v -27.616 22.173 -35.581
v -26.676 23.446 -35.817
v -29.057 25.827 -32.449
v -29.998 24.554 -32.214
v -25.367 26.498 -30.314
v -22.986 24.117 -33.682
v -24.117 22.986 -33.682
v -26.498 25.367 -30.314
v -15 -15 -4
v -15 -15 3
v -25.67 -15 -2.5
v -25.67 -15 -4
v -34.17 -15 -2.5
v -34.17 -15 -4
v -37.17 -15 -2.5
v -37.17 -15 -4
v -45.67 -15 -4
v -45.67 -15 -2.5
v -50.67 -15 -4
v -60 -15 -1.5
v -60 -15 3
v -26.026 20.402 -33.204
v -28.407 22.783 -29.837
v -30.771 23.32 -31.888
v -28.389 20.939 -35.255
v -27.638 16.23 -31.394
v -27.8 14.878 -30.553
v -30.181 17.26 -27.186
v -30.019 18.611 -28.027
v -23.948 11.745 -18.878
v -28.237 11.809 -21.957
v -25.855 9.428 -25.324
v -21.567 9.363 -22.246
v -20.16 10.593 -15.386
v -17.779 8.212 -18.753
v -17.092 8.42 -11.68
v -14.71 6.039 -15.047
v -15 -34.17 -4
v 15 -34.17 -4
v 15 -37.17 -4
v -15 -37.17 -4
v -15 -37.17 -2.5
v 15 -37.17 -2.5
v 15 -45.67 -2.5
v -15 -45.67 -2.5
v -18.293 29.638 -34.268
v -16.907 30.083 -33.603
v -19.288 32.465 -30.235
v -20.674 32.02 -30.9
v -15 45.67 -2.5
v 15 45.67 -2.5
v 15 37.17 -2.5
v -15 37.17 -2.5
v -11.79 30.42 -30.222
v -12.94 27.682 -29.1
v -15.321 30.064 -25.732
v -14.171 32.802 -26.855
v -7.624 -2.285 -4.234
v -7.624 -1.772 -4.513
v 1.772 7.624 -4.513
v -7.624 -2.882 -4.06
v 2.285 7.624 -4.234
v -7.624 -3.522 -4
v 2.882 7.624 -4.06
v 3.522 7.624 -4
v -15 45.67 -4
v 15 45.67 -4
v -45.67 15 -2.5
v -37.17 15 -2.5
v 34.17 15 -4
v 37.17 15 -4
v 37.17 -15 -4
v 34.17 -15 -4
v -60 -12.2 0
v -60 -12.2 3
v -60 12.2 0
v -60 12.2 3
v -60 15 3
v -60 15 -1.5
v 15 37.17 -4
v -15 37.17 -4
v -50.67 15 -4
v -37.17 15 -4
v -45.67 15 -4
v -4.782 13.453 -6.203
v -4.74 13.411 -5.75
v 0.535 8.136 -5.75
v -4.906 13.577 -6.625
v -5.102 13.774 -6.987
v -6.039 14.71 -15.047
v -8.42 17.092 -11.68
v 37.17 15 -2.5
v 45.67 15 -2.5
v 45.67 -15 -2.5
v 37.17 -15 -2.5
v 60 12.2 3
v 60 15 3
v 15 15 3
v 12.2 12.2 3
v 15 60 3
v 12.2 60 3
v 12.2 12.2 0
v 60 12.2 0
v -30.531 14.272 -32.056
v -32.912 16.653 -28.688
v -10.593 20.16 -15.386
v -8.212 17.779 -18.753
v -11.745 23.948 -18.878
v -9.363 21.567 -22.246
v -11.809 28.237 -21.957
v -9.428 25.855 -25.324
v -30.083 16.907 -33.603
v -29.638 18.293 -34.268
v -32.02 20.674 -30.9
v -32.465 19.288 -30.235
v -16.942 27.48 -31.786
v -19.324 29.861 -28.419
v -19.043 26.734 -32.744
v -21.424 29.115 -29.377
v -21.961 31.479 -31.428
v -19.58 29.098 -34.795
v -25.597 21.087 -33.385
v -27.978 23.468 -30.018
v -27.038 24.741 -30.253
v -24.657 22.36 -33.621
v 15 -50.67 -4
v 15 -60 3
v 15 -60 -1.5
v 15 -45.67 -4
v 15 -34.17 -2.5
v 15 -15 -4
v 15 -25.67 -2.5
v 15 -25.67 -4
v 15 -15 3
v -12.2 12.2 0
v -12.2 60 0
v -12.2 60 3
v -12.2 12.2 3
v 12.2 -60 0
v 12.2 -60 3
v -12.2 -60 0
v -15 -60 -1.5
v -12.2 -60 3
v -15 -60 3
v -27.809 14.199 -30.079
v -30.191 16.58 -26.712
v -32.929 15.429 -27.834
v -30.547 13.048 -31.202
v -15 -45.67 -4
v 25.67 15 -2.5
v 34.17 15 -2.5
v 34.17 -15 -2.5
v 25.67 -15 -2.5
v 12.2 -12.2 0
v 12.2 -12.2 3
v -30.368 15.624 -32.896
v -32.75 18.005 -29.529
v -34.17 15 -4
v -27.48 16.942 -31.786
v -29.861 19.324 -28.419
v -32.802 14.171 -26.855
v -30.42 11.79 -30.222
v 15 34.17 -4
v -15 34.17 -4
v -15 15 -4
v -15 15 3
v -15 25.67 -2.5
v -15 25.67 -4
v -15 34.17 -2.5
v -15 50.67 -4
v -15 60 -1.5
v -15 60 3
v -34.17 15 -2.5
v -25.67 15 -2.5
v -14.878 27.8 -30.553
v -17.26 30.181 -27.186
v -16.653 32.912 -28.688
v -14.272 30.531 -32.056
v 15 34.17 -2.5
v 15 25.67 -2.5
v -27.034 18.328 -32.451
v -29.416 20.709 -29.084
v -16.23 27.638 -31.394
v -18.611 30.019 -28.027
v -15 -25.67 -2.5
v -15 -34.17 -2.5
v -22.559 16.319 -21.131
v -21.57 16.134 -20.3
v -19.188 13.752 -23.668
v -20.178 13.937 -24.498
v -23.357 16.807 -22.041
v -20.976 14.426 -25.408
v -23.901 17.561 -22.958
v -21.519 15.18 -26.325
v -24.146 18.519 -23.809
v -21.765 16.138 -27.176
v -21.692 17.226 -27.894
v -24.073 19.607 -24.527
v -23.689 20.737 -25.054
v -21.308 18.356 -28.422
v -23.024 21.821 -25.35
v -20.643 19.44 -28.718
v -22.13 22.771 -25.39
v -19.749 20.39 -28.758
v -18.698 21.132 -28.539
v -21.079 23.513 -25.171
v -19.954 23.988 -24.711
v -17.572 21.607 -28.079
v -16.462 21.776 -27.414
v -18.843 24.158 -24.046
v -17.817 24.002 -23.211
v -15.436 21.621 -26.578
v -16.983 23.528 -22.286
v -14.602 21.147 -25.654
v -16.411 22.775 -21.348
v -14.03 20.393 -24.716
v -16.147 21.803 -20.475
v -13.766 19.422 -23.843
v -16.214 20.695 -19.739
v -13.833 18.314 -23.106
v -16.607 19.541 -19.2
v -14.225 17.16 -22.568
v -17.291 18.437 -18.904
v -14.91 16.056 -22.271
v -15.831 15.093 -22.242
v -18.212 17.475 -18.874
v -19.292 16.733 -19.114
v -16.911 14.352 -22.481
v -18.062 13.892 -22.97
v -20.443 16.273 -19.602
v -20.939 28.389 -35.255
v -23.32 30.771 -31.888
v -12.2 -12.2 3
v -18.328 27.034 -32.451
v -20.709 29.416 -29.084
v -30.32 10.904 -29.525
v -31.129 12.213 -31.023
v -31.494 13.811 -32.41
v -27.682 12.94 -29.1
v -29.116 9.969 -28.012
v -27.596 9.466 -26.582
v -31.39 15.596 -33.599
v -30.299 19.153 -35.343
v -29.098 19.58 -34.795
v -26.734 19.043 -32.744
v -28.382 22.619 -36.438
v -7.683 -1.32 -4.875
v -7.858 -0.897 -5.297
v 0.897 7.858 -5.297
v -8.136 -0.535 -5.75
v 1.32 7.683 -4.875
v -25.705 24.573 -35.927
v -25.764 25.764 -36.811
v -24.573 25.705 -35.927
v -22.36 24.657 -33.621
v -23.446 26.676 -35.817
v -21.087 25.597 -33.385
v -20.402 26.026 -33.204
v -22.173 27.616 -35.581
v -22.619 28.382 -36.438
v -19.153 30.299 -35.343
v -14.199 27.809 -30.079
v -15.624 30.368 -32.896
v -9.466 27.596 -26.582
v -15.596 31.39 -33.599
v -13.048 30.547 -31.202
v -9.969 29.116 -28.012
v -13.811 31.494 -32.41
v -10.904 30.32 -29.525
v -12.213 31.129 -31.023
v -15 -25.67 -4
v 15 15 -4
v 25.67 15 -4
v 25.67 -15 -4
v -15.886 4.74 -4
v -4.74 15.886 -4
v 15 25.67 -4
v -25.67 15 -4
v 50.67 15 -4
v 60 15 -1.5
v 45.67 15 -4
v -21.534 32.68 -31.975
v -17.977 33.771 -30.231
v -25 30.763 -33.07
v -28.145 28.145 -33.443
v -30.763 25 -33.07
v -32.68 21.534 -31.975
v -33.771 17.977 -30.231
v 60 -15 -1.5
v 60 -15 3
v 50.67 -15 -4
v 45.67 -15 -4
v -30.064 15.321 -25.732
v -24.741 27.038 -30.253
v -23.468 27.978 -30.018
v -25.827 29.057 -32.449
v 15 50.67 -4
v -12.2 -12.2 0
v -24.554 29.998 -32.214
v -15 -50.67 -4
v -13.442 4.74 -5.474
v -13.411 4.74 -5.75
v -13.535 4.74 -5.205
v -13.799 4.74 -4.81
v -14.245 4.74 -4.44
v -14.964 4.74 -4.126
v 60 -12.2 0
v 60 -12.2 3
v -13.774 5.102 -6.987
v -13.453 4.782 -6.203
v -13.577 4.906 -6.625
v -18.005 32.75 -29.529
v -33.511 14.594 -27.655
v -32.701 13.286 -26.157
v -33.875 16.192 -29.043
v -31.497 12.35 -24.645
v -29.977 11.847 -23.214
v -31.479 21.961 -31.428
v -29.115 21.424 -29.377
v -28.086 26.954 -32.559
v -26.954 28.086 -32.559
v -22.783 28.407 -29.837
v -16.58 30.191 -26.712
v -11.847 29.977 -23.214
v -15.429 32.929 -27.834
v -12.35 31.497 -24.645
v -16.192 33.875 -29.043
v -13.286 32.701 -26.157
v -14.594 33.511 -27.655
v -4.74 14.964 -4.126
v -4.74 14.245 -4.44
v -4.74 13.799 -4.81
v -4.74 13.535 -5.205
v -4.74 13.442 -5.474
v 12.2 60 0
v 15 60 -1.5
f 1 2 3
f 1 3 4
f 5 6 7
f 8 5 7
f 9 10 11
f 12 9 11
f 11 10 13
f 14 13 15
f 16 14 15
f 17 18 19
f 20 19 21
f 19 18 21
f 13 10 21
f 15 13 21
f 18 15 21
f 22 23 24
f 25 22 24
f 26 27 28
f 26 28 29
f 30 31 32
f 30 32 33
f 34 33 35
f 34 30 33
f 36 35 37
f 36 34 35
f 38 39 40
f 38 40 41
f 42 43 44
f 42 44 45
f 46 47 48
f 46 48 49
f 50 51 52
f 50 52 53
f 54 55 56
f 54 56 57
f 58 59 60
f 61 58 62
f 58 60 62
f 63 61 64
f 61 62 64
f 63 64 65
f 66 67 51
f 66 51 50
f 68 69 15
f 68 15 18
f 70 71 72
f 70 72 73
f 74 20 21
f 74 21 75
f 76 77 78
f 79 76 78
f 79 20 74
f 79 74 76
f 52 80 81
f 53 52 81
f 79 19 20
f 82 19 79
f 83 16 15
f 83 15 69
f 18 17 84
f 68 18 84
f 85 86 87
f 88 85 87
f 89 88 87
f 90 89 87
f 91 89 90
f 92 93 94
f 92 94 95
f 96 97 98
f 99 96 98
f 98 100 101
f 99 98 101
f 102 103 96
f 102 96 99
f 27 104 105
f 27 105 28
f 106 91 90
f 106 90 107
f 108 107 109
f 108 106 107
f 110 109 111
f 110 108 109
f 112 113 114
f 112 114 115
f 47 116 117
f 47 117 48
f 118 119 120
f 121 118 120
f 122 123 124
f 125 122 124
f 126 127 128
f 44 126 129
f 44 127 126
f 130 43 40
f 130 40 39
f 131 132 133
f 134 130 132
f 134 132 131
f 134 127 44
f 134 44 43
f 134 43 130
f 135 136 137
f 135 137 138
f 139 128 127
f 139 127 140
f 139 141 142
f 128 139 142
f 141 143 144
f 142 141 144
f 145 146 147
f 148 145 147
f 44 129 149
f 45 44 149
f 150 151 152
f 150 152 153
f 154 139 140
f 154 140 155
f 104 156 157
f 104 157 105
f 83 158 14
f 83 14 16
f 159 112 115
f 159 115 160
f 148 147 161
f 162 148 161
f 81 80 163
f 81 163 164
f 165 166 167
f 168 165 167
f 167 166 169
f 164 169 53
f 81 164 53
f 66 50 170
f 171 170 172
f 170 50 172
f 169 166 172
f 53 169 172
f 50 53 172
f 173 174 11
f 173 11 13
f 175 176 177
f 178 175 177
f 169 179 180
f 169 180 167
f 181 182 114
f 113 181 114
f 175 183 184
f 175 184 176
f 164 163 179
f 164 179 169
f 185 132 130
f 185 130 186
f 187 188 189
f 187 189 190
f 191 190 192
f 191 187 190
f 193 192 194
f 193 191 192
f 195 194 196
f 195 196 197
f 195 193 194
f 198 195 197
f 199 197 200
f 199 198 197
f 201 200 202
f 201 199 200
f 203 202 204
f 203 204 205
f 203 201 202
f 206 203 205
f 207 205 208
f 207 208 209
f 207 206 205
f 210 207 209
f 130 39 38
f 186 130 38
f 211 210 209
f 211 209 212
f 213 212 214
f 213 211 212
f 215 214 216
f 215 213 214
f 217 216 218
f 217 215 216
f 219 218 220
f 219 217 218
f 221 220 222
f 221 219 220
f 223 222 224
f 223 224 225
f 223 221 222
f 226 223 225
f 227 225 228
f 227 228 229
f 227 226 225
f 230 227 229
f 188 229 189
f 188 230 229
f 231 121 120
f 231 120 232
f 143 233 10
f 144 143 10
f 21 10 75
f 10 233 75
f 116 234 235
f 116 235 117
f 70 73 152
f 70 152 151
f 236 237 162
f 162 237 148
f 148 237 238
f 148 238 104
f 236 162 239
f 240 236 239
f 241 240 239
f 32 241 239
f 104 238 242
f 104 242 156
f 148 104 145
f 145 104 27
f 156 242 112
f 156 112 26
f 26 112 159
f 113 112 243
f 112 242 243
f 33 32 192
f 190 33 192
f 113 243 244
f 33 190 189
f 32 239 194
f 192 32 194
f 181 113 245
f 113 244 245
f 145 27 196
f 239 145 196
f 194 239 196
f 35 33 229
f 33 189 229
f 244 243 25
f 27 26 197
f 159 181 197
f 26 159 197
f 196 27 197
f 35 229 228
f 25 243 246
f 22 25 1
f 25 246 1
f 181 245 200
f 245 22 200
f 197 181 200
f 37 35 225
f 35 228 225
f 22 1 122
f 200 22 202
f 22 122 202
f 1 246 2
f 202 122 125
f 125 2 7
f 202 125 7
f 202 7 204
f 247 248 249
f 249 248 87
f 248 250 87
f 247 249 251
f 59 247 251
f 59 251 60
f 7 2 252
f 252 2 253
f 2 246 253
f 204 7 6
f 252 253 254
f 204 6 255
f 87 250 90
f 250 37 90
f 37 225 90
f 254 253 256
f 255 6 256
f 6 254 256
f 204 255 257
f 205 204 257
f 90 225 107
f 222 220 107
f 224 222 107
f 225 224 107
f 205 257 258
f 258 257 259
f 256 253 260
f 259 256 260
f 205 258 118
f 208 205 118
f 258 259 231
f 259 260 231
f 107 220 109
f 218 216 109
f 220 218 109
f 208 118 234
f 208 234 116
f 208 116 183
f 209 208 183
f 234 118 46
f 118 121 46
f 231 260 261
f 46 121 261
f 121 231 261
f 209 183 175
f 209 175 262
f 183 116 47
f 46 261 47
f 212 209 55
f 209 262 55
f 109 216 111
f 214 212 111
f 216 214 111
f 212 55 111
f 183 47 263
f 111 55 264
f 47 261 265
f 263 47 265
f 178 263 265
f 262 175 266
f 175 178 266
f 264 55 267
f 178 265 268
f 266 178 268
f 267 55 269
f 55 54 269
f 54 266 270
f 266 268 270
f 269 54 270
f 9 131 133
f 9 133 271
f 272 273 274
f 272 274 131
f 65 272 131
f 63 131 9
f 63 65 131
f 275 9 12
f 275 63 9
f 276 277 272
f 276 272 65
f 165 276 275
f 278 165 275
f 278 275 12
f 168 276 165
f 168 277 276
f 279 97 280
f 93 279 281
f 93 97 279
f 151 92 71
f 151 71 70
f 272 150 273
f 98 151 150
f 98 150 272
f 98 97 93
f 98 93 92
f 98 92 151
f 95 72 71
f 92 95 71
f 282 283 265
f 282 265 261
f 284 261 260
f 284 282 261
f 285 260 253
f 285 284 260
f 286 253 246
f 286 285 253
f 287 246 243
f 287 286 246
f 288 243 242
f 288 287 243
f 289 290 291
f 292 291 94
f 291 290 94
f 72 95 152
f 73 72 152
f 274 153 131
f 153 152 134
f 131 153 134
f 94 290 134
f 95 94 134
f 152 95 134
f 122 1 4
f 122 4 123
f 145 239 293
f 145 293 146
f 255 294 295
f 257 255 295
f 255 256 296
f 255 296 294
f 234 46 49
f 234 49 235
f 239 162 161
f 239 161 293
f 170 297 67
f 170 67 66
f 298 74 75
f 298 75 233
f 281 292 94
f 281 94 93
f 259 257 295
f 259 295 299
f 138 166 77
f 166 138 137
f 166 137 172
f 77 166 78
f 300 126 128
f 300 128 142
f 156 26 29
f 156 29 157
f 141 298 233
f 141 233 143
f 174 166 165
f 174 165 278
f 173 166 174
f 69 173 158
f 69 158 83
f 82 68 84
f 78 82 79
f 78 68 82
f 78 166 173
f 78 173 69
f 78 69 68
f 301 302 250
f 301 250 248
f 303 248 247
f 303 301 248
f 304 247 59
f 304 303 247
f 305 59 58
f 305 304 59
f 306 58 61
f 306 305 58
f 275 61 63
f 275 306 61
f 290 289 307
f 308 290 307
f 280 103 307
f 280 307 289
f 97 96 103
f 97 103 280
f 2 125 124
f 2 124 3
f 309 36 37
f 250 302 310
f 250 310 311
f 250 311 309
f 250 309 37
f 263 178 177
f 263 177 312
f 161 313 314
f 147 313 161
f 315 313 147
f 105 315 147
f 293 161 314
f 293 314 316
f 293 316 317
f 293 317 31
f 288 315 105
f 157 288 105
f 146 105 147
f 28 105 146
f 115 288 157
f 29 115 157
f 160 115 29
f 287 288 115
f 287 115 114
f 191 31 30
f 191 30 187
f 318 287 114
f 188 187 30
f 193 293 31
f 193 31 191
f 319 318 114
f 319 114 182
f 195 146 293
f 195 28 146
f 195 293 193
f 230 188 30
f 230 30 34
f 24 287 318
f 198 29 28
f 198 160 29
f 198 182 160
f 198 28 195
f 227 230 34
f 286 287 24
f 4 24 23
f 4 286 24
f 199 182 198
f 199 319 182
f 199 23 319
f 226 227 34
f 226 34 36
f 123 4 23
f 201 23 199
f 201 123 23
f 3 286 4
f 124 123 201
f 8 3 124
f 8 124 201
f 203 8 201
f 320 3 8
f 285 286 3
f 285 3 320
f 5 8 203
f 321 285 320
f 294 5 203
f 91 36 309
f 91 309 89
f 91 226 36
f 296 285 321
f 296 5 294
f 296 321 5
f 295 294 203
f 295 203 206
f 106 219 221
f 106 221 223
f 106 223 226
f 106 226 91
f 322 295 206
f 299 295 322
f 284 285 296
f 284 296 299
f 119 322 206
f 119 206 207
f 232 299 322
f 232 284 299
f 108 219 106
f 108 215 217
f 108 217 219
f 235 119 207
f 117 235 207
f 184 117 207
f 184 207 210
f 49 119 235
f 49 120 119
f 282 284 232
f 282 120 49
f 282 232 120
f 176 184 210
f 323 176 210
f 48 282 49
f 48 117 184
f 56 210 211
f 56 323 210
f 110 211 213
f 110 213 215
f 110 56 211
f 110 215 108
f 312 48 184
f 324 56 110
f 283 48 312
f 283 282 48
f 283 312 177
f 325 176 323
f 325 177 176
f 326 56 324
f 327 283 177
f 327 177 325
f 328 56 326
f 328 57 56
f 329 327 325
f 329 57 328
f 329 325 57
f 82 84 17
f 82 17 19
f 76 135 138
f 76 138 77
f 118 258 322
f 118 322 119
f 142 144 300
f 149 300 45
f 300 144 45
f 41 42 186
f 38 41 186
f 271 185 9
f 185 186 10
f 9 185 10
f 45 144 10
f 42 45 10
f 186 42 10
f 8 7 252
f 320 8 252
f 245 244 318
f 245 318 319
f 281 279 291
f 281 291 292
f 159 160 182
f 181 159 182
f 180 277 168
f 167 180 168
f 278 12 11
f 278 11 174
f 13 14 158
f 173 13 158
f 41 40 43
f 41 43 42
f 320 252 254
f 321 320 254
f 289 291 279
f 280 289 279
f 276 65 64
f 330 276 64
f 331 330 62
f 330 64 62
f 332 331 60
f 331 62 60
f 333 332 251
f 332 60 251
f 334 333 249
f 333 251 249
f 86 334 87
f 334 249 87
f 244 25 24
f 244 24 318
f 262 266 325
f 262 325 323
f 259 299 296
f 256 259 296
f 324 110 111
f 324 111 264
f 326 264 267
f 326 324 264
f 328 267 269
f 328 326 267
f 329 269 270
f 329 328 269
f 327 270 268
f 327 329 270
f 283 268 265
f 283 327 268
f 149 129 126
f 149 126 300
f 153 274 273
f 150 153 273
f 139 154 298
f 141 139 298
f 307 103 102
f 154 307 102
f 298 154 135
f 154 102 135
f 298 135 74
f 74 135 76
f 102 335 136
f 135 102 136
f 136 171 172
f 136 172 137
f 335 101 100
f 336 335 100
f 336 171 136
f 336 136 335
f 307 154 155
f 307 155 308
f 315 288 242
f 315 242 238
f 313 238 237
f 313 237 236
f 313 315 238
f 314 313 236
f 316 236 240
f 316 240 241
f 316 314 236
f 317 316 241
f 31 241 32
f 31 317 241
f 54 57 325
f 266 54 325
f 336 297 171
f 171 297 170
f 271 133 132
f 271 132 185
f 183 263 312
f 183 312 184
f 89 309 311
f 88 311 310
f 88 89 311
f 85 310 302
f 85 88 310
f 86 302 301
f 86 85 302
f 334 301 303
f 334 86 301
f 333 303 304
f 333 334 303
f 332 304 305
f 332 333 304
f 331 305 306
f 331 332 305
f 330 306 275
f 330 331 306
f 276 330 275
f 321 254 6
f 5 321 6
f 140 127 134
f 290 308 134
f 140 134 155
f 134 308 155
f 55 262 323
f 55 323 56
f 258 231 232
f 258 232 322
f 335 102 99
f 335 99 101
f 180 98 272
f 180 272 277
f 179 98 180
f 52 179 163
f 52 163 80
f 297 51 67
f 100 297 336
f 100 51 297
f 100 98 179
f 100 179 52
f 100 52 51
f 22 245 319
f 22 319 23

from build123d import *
from OCP.BRepFilletAPI import BRepFilletAPI_MakeChamfer

# Parameters (mm, degrees)
SKETCH1_W           = 1.85
SKETCH1_H           = 38.85
SKETCH1_H_2         = 6.15
SKETCH1_W_2         = 44.85
SKETCH1_H_3         = 1.85
SKETCH1_W_3         = 0.15
BOSS_EXTRUDE1_DEPTH = 3
SKETCH1_4_W         = 120
SKETCH1_4_H         = 30
SKETCH1_4_W_2       = 30
SKETCH1_4_H_2       = 120
BOSS_EXTRUDE3_DEPTH = 4
BOSS_EXTRUDE9_DEPTH = 3
CHAMFER1_SIZE       = 2.5
CHAMFER1_SIZE2      = 9.330127019
SKETCH4_W           = 8.5
SKETCH4_H           = 30
SKETCH4_W_2         = 30
SKETCH4_H_2         = 8.5
CUT_EXTRUDE1_DEPTH  = 1.5
BOSS_EXTRUDE7_DEPTH = 4.7625
SKETCH10_R          = 14.258178215
CUT_EXTRUDE2_DEPTH  = 91.287114527
FILLET1_R           = 1.75
BOSS_EXTRUDE8_DEPTH = 4.7625
CUT_EXTRUDE3_DEPTH  = 97.69049149


with BuildPart() as part:
    # Sketch1 → Boss-Extrude1 (new body)
    with BuildSketch(Plane(origin=(0, 0, 0), x_dir=(-1, 0, 0), z_dir=(0, 0, -1))):
        with Locations((14.075, 40.575)):
            Rectangle(SKETCH1_W, SKETCH1_H)
        with Locations((14.075, 18.075)):
            Rectangle(SKETCH1_W, SKETCH1_H_2)
        with Locations((37.575, 14.075)):
            Rectangle(SKETCH1_W_2, SKETCH1_H_3)
        with Locations((14.075, 14.075)):
            Rectangle(SKETCH1_W, SKETCH1_H_3)
        with Locations((14.075, -14.075)):
            Rectangle(SKETCH1_W, SKETCH1_H_3)
        with Locations((14.075, -18.075)):
            Rectangle(SKETCH1_W, SKETCH1_H_2)
        with Locations((37.575, -14.075)):
            Rectangle(SKETCH1_W_2, SKETCH1_H_3)
        with Locations((14.075, -40.575)):
            Rectangle(SKETCH1_W, SKETCH1_H)
        with Locations((-14.075, -14.075)):
            Rectangle(SKETCH1_W, SKETCH1_H_3)
        with Locations((-14.075, -18.075)):
            Rectangle(SKETCH1_W, SKETCH1_H_2)
        with Locations((-37.575, -14.075)):
            Rectangle(SKETCH1_W_2, SKETCH1_H_3)
        with Locations((-15.075, -14.075)):
            Rectangle(SKETCH1_W_3, SKETCH1_H_3)
        with Locations((15.075, -14.075)):
            Rectangle(SKETCH1_W_3, SKETCH1_H_3)
        with Locations((15.075, 14.075)):
            Rectangle(SKETCH1_W_3, SKETCH1_H_3)
        with Locations((-37.575, 14.075)):
            Rectangle(SKETCH1_W_2, SKETCH1_H_3)
        with Locations((-15.075, 14.075)):
            Rectangle(SKETCH1_W_3, SKETCH1_H_3)
        with Locations((-14.075, 18.075)):
            Rectangle(SKETCH1_W, SKETCH1_H_2)
        with Locations((-14.075, 14.075)):
            Rectangle(SKETCH1_W, SKETCH1_H_3)
        with Locations((-14.075, 40.575)):
            Rectangle(SKETCH1_W, SKETCH1_H)
        with Locations((-14.075, -40.575)):
            Rectangle(SKETCH1_W, SKETCH1_H)
    extrude(amount=-BOSS_EXTRUDE1_DEPTH)

    # Sketch1<4> → Boss-Extrude3 (add)
    with BuildSketch(Plane(origin=(0, 0, 0), x_dir=(-1, 0, 0), z_dir=(0, 0, -1))):
        Rectangle(SKETCH1_4_W, SKETCH1_4_H)
        Rectangle(SKETCH1_4_W_2, SKETCH1_4_H_2)
    extrude(amount=BOSS_EXTRUDE3_DEPTH)

    # Sketch13 → Boss-Extrude9 (add)
    with BuildSketch(Plane.XY):
        Polygon((-12.2, 12.2), (-60, 12.2), (-60, 13.15), (-13.15, 13.15), (-13.15, 60), (-12.2, 60), align=None)
        Polygon((-60, -12.2), (-12.2, -12.2), (-12.2, -60), (-13.15, -60), (-13.15, -13.15), (-60, -13.15), align=None)
        Polygon((12.2, -60), (12.2, -12.2), (60, -12.2), (60, -13.15), (13.15, -13.15), (13.15, -60), align=None)
        Polygon((60, 12.2), (12.2, 12.2), (12.2, 60), (13.15, 60), (13.15, 13.15), (60, 13.15), align=None)
    extrude(amount=BOSS_EXTRUDE9_DEPTH)

    # Chamfer1: one chamfer whose edges measure the first distance from different faces: ONE call of the kernel's chamfer builder (chamfer() names one face for all edges)
    chamfer1_edges_1 = [part.edges().sort_by_distance(p)[0] for p in [
        (60, 0, -4),
    ]]
    chamfer1_side_1 = [part.faces().sort_by_distance(p)[0] for p in [
        (60, 0, -1.570175439),
    ]]
    chamfer1_edges_2 = [part.edges().sort_by_distance(p)[0] for p in [
        (0, 60, -4),
    ]]
    chamfer1_side_2 = [part.faces().sort_by_distance(p)[0] for p in [
        (0, 60, -1.570175439),
    ]]
    chamfer1_edges_3 = [part.edges().sort_by_distance(p)[0] for p in [
        (0, -60, -4),
    ]]
    chamfer1_side_3 = [part.faces().sort_by_distance(p)[0] for p in [
        (0, -60, -1.570175439),
    ]]
    chamfer1_edges_4 = [part.edges().sort_by_distance(p)[0] for p in [
        (-60, 0, -4),
    ]]
    chamfer1_side_4 = [part.faces().sort_by_distance(p)[0] for p in [
        (-60, 0, -1.570175439),
    ]]
    chamfer1 = BRepFilletAPI_MakeChamfer(part.part.solid().wrapped)
    for e in chamfer1_edges_1:
        chamfer1.Add(CHAMFER1_SIZE, CHAMFER1_SIZE2, e.wrapped, chamfer1_side_1[0].wrapped)  # the first distance lies on this face
    for e in chamfer1_edges_2:
        chamfer1.Add(CHAMFER1_SIZE, CHAMFER1_SIZE2, e.wrapped, chamfer1_side_2[0].wrapped)  # the first distance lies on this face
    for e in chamfer1_edges_3:
        chamfer1.Add(CHAMFER1_SIZE, CHAMFER1_SIZE2, e.wrapped, chamfer1_side_3[0].wrapped)  # the first distance lies on this face
    for e in chamfer1_edges_4:
        chamfer1.Add(CHAMFER1_SIZE, CHAMFER1_SIZE2, e.wrapped, chamfer1_side_4[0].wrapped)  # the first distance lies on this face
    add(Compound.cast(chamfer1.Shape()), mode=Mode.REPLACE)

    # Sketch4 → Cut-Extrude1 (cut)
    with BuildSketch(Plane(origin=(0, 0, -4), x_dir=(-1, 0, 0), z_dir=(0, 0, -1))):
        with Locations((-41.419872981, 0)):
            Rectangle(SKETCH4_W, SKETCH4_H)
        with Locations((-29.919872981, 0)):
            Rectangle(SKETCH4_W, SKETCH4_H)
        with Locations((0, 41.419872981)):
            Rectangle(SKETCH4_W_2, SKETCH4_H_2)
        with Locations((0, 29.919872981)):
            Rectangle(SKETCH4_W_2, SKETCH4_H_2)
        with Locations((29.919872981, 0)):
            Rectangle(SKETCH4_W, SKETCH4_H)
        with Locations((41.419872981, 0)):
            Rectangle(SKETCH4_W, SKETCH4_H)
        with Locations((0, -29.919872981)):
            Rectangle(SKETCH4_W_2, SKETCH4_H_2)
        with Locations((0, -41.419872981)):
            Rectangle(SKETCH4_W_2, SKETCH4_H_2)
    extrude(amount=-CUT_EXTRUDE1_DEPTH, mode=Mode.SUBTRACT)

    # Sketch9 → Boss-Extrude7 (add)
    with BuildSketch(Plane(origin=(-2.248627702, 2.248627702, 3.180039793), x_dir=(-0.86602540378444, -0.28867513459481, -0.40824829046386224), z_dir=(0.4999999999999977, -0.49999999999999806, -0.7071067811865507))):
        with BuildLine():
            Line((26.502649854, 26.860285477), (21.488288715, 19.768907948))
            Line((21.488288715, 19.768907948), (7.054531985, -0.643506575))
            Line((7.054531985, -0.643506575), (-2.958214479, 6.436574348))
            Line((-2.958214479, 6.436574348), (11.475542251, 26.848988872))
            Line((11.475542251, 26.848988872), (16.48990339, 33.940366401))
            ThreePointArc((16.48990339, 33.940366401), (25.036317083, 35.406699171), (26.502649854, 26.860285477))
        make_face()
        with BuildLine():
            ThreePointArc((19.161917241, 33.60764173), (16.307451178, 27.650713492), (22.309959452, 24.893384176))
            ThreePointArc((22.309959452, 24.893384176), (25.022858564, 30.799171082), (19.161917241, 33.60764173))
        make_face(mode=Mode.SUBTRACT)
    extrude(amount=BOSS_EXTRUDE7_DEPTH)

    # Sketch10 → Cut-Extrude2 (cut, through all)
    with BuildSketch(Plane.XY):
        Circle(SKETCH10_R)
    extrude(amount=CUT_EXTRUDE2_DEPTH, mode=Mode.SUBTRACT)

    # Fillet1
    fillet1_edges = [part.edges().sort_by_distance(p)[0] for p in [
        (-2.56318253, 2.56318253, -4),
        (-7.32568253, 7.32568253, -4),
        (-9.280078929, 0.60878613, -4),
        (-0.60878613, 9.280078929, -4),
    ]]
    fillet(fillet1_edges, radius=FILLET1_R)

    # Sketch11 → Boss-Extrude8 (add)
    with BuildSketch(Plane(origin=(-2.248627702, 2.248627702, 3.180039793), x_dir=(0.86602540378444, 0.28867513459481003, 0.4082482904638624), z_dir=(-0.4999999999999978, 0.4999999999999982, 0.7071067811865503))):
        with BuildLine():
            ThreePointArc((-26.502649854, 26.860285477), (-25.036317083, 35.406699171), (-16.48990339, 33.940366401))
            Line((-16.48990339, 33.940366401), (-7.126405249, 20.698380338))
            ThreePointArc((-7.126405249, 20.698380338), (-10.454022038, 27.858169656), (-11.039574704, 35.731716801))
            ThreePointArc((-11.039574704, 35.731716801), (-12.744347828, 41.802023869), (-18.161788795, 45.027890059))
            ThreePointArc((-18.161788795, 45.027890059), (-29.902759178, 42.288887582), (-36.398772273, 32.132395373))
            ThreePointArc((-36.398772273, 32.132395373), (-35.163210117, 25.949494318), (-30.008327436, 22.318783113))
            ThreePointArc((-30.008327436, 22.318783113), (-22.780260221, 19.142203051), (-17.139151713, 13.618299415))
            Line((-17.139151713, 13.618299415), (-26.502649854, 26.860285477))
        make_face()
    extrude(amount=-BOSS_EXTRUDE8_DEPTH)

    # Sketch12 → Cut-Extrude3 (cut, through all)
    with BuildSketch(Plane(origin=(-2.248627702, 2.248627702, 3.180039793), x_dir=(0.86602540378444, 0.28867513459481003, 0.4082482904638624), z_dir=(-0.4999999999999978, 0.4999999999999982, 0.7071067811865503))):
        Polygon((-25.756076527, 43.091629588), (-27.225983794, 42.459670234), (-25.971939452, 39.542823), (-24.502032185, 40.174782353), align=None)
        Polygon((-28.527874077, 41.730147071), (-26.694786972, 39.137770427), (-28.001181502, 38.214009996), (-29.834268606, 40.80638664), align=None)
        Polygon((-22.761781271, 43.84707133), (-24.330959276, 43.53453271), (-23.710765452, 40.420695106), (-22.141587447, 40.733233726), align=None)
        Polygon((-19.675853381, 43.963455868), (-21.275721515, 43.983997418), (-21.316483655, 40.809259091), (-19.716615522, 40.78871754), align=None)
        Polygon((-16.633162714, 43.435696639), (-18.193799062, 43.788420596), (-18.893735665, 40.691532844), (-17.333099317, 40.338808886), align=None)
        Polygon((-13.766689451, 42.286859254), (-15.219886716, 42.956349889), (-16.548407194, 40.072661566), (-15.095209929, 39.403170932), align=None)
        Polygon((-30.956033068, 39.822127099), (-32.04181915, 38.646938354), (-29.709803985, 36.492331599), (-28.624017903, 37.667520343), align=None)
        Polygon((-32.934431301, 37.450959299), (-33.752154873, 36.075703628), (-31.023131901, 34.453033416), (-30.205408329, 35.828289087), align=None)
        Polygon((-34.376603279, 34.720275083), (-34.890525897, 33.205057758), (-31.883766517, 32.185242563), (-31.3698439, 33.700459888), align=None)
        Polygon((-35.219519168, 31.749418455), (-35.407179947, 30.160461743), (-32.254093972, 29.788072384), (-32.066433193, 31.377029095), align=None)
        Polygon((-35.426339496, 28.668230104), (-35.279536761, 27.074979039), (-32.117929178, 27.366290716), (-32.264731914, 28.959541782), align=None)
    extrude(amount=-CUT_EXTRUDE3_DEPTH, mode=Mode.SUBTRACT)


solid = part.part
